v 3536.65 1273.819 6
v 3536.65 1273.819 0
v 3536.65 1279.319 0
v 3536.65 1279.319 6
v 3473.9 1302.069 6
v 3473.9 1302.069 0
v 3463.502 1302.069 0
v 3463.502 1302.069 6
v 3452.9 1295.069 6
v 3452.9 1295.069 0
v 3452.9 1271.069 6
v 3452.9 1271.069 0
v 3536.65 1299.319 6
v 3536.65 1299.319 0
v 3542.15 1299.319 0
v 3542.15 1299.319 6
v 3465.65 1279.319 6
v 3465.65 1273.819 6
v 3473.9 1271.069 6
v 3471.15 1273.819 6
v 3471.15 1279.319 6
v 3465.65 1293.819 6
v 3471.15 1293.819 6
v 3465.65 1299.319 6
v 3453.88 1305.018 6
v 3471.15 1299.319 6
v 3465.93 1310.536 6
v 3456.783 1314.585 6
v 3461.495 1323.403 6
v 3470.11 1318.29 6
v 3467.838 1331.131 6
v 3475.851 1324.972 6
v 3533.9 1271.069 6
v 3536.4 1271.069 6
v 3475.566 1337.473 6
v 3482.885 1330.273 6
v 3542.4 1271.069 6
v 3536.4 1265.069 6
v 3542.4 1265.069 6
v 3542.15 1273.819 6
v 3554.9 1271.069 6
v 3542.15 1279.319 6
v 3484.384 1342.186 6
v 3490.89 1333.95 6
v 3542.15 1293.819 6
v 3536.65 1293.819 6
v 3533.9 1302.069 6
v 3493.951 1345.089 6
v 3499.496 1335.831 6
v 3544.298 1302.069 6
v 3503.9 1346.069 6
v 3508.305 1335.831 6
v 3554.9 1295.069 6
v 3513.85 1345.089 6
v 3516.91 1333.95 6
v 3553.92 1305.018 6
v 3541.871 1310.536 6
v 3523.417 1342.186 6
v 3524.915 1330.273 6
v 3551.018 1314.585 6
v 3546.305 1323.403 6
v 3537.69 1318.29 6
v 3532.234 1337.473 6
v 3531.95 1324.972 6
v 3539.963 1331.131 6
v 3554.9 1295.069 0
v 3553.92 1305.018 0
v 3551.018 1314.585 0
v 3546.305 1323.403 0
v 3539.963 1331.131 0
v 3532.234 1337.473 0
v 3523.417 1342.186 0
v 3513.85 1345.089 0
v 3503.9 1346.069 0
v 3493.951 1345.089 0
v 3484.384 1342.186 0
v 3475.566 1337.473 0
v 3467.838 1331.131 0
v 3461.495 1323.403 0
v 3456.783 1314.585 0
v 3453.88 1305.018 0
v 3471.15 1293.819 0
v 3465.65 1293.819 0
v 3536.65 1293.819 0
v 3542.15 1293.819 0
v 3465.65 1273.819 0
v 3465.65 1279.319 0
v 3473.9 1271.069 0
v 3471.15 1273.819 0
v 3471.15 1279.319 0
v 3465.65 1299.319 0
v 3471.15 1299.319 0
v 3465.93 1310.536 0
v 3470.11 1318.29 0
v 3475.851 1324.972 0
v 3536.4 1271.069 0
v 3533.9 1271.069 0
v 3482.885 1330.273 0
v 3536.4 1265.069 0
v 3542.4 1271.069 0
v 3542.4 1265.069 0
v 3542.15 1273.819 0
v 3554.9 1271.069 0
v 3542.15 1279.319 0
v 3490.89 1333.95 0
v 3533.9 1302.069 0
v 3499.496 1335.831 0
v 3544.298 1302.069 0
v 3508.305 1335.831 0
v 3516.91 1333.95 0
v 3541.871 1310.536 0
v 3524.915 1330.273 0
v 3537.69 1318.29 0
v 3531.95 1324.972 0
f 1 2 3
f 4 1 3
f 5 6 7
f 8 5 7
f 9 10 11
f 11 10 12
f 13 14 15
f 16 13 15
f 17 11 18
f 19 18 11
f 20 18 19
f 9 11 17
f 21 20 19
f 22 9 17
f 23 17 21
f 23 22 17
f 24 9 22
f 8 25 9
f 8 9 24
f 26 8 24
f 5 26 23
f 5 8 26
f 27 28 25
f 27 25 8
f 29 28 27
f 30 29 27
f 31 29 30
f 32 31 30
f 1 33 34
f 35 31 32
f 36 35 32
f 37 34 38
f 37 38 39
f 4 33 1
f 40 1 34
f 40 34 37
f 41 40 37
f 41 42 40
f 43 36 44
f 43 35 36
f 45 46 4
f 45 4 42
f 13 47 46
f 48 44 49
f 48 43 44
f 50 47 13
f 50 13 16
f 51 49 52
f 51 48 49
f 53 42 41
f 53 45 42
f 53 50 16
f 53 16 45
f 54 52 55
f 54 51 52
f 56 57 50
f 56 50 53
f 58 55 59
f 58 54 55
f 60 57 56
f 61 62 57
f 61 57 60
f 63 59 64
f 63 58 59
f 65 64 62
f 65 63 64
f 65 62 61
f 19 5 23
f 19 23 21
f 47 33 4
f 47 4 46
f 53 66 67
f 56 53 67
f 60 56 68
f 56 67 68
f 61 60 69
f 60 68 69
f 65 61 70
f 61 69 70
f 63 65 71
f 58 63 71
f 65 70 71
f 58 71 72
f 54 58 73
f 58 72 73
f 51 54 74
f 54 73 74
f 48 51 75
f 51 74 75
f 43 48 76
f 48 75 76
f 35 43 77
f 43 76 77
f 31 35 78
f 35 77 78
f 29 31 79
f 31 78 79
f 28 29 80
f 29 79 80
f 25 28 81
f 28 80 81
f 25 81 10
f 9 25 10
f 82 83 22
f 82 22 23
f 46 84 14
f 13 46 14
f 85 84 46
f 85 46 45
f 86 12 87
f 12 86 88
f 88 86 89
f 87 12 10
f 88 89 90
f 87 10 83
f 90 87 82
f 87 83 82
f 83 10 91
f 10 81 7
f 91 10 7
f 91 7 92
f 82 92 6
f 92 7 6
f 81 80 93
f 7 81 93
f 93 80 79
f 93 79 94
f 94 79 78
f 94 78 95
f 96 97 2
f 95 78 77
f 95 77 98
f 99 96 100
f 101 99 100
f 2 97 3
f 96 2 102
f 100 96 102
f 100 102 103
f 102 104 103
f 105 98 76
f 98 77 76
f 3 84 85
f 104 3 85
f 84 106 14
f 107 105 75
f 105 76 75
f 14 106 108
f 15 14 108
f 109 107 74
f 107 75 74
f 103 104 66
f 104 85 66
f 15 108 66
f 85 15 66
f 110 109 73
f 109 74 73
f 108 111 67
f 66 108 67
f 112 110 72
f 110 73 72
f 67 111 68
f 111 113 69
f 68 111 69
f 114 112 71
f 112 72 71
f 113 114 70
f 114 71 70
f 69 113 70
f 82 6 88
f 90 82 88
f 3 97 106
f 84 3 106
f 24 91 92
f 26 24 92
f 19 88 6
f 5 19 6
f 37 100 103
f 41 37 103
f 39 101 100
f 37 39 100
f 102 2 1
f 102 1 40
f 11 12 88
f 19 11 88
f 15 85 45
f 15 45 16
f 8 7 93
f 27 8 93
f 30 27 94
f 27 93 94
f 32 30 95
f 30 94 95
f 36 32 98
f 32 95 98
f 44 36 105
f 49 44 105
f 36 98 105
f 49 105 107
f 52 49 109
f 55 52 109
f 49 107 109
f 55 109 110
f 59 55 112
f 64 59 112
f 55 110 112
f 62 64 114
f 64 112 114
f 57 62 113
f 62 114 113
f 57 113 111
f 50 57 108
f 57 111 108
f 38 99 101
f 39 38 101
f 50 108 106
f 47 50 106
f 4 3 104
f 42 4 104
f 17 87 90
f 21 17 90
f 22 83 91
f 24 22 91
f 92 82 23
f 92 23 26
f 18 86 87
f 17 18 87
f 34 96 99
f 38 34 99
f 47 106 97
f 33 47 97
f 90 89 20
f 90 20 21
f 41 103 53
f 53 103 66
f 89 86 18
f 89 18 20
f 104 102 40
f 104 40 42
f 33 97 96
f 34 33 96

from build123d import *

# Parameters (mm, degrees)
MODEL_W             = 5.5
MODEL_H             = 5.5
BOSS_EXTRUDE1_DEPTH = 6


with BuildPart() as part:
    # Model → Boss-Extrude1 (new body)
    with BuildSketch(Plane.XY):
        with BuildLine():
            Line((3452.90039403, 1295.068502361), (3452.90039403, 1271.068502361))
            Line((3452.90039403, 1271.068502361), (3462.90039403, 1271.068502361))
            Line((3462.90039403, 1271.068502361), (3473.90039403, 1271.068502361))
            Line((3473.90039403, 1271.068502361), (3473.90039403, 1302.068502361))
            Line((3473.90039403, 1302.068502361), (3463.502374277, 1302.068502361))
            ThreePointArc((3463.502374277, 1302.068502361), (3503.90039403, 1336.068502361), (3544.298413784, 1302.068502361))
            Line((3544.298413784, 1302.068502361), (3533.90039403, 1302.068502361))
            Line((3533.90039403, 1302.068502361), (3533.90039403, 1271.068502361))
            Line((3533.90039403, 1271.068502361), (3536.40039403, 1271.068502361))
            Line((3536.40039403, 1271.068502361), (3536.40039403, 1265.068502361))
            Line((3536.40039403, 1265.068502361), (3542.40039403, 1265.068502361))
            Line((3542.40039403, 1265.068502361), (3542.40039403, 1271.068502361))
            Line((3542.40039403, 1271.068502361), (3554.90039403, 1271.068502361))
            Line((3554.90039403, 1271.068502361), (3554.90039403, 1295.068502361))
            ThreePointArc((3554.90039403, 1295.068502361), (3503.90039403, 1346.068502361), (3452.90039403, 1295.068502361))
        make_face()
        with Locations((3539.40039403, 1276.568502361)):
            Rectangle(MODEL_W, MODEL_H, mode=Mode.SUBTRACT)
        with Locations((3539.40039403, 1296.568502361)):
            Rectangle(MODEL_W, MODEL_H, mode=Mode.SUBTRACT)
        with Locations((3468.40039403, 1276.568502361)):
            Rectangle(MODEL_W, MODEL_H, mode=Mode.SUBTRACT)
        with Locations((3468.40039403, 1296.568502361)):
            Rectangle(MODEL_W, MODEL_H, mode=Mode.SUBTRACT)
    extrude(amount=BOSS_EXTRUDE1_DEPTH)


solid = part.part
